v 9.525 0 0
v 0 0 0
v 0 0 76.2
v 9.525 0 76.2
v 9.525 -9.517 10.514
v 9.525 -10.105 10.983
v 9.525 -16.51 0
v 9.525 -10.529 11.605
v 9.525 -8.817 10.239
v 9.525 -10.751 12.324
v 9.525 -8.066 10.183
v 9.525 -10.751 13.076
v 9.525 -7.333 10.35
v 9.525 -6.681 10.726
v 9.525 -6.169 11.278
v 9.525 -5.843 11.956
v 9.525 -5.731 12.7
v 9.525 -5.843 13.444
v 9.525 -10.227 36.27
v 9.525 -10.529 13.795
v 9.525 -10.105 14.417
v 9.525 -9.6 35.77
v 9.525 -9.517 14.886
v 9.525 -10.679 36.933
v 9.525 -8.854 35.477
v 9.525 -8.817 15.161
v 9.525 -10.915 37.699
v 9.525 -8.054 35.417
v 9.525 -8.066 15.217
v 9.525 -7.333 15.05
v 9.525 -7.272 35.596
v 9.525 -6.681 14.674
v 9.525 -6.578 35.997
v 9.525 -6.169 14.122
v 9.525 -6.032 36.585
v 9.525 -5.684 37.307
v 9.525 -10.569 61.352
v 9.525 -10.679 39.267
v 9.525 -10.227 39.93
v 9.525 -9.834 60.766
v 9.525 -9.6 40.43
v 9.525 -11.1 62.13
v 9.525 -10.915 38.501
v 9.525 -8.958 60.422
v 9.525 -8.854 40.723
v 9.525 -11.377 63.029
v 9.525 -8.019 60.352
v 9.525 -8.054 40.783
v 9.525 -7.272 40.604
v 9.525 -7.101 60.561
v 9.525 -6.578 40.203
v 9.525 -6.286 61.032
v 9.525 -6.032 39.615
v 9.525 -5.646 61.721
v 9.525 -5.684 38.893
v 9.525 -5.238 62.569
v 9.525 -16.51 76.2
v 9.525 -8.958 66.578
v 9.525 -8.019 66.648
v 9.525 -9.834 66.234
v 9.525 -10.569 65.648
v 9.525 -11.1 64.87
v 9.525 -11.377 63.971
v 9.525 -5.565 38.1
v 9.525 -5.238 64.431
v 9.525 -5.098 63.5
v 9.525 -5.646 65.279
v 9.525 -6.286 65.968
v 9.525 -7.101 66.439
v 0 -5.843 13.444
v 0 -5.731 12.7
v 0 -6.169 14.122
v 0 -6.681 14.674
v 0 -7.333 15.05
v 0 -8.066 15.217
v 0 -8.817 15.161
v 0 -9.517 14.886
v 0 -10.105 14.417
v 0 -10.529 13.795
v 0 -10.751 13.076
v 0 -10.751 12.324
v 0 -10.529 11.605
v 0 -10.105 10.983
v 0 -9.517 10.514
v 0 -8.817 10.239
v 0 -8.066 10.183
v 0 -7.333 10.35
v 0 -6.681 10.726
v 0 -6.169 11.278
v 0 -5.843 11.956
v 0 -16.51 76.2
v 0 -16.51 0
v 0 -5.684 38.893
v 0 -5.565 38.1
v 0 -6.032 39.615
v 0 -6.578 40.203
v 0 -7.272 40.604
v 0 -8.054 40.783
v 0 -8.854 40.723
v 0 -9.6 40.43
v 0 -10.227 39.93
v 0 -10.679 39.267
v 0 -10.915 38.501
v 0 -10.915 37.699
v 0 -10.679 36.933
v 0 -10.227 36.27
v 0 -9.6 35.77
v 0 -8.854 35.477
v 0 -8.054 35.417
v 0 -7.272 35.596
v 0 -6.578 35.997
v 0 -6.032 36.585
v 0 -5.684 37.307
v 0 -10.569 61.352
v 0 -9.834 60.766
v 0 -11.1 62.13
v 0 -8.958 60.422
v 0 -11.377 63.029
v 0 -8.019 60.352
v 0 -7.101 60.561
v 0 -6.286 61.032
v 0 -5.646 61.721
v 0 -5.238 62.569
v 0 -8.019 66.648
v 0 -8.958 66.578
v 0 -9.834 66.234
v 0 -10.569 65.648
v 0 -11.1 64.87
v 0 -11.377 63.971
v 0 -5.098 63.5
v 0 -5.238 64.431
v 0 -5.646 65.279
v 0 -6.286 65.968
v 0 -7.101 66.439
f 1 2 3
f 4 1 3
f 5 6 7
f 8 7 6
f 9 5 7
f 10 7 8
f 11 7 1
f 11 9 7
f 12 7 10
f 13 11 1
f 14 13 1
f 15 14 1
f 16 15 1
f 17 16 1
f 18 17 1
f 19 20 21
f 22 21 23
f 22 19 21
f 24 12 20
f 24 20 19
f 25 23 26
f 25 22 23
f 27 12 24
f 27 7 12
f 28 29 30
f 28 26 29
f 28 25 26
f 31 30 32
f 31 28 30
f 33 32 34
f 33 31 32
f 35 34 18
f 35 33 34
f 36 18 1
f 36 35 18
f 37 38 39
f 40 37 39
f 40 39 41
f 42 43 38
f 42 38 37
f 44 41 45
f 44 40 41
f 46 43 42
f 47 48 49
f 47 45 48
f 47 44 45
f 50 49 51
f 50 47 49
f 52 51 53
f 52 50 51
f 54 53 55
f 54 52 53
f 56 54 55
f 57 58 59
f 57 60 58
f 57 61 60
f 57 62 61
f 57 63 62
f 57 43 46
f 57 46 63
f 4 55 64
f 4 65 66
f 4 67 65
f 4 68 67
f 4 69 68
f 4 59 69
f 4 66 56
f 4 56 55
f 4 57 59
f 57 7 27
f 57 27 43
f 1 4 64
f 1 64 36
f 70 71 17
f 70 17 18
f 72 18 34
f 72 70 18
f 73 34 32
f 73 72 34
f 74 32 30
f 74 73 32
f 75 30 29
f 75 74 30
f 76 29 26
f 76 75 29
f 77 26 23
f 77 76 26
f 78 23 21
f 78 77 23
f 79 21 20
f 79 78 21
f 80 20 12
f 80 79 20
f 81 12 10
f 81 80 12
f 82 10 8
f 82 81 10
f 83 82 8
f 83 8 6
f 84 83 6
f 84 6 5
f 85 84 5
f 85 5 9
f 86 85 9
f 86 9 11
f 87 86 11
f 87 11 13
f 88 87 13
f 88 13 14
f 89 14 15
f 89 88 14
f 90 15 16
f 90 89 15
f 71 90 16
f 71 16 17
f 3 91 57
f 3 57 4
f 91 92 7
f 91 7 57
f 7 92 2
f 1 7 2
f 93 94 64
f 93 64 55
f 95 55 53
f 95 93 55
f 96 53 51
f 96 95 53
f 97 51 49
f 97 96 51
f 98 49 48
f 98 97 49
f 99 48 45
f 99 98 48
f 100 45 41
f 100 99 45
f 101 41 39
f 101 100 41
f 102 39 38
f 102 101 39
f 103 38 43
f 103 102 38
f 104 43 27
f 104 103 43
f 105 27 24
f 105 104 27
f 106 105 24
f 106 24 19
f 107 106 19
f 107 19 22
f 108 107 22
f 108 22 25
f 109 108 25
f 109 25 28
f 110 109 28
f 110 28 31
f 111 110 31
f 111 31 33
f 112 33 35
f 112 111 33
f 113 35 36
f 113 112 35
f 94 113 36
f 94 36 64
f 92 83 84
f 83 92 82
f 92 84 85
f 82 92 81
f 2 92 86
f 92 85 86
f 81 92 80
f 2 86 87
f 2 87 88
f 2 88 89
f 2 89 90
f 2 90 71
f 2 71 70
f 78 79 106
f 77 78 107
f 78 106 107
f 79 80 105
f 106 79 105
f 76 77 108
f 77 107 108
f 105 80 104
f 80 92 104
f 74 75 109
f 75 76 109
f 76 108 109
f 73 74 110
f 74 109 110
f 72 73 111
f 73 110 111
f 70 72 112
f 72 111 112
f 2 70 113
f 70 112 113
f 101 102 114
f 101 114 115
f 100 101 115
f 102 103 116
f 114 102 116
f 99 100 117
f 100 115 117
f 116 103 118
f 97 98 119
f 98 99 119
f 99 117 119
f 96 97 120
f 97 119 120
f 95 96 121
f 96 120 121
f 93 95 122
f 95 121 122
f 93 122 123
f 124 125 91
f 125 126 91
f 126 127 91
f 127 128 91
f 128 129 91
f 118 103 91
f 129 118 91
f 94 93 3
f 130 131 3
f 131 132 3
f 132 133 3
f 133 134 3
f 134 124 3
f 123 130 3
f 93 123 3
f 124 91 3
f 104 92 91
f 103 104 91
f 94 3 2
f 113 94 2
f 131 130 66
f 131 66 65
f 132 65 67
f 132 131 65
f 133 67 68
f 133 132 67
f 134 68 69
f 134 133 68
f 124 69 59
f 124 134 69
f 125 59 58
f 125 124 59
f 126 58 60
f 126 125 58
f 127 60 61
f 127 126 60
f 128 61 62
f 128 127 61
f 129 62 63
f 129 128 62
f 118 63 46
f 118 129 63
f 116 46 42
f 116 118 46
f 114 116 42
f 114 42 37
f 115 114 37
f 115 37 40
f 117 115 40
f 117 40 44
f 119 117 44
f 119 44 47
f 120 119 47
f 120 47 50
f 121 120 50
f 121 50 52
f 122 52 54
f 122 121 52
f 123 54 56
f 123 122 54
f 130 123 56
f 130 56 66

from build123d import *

# Parameters (mm, degrees)
F0_W     = 16.51
F0_H     = 76.2
F0_R     = 2.52436
F0_R_2   = 2.690087
F0_R_3   = 3.157328
F1_DEPTH = 9.525


with BuildPart() as f1:
    # F0 (on Right) → F1 (new body)
    with BuildSketch(Plane.YZ):
        with Locations((-8.255, 38.1)):
            Rectangle(F0_W, F0_H)
        with Locations((-8.255, 12.7)):
            Circle(F0_R, mode=Mode.SUBTRACT)
        with Locations((-8.255, 38.1)):
            Circle(F0_R_2, mode=Mode.SUBTRACT)
        with Locations((-8.255, 63.5)):
            Circle(F0_R_3, mode=Mode.SUBTRACT)
    extrude(amount=F1_DEPTH)


solid = f1.part
